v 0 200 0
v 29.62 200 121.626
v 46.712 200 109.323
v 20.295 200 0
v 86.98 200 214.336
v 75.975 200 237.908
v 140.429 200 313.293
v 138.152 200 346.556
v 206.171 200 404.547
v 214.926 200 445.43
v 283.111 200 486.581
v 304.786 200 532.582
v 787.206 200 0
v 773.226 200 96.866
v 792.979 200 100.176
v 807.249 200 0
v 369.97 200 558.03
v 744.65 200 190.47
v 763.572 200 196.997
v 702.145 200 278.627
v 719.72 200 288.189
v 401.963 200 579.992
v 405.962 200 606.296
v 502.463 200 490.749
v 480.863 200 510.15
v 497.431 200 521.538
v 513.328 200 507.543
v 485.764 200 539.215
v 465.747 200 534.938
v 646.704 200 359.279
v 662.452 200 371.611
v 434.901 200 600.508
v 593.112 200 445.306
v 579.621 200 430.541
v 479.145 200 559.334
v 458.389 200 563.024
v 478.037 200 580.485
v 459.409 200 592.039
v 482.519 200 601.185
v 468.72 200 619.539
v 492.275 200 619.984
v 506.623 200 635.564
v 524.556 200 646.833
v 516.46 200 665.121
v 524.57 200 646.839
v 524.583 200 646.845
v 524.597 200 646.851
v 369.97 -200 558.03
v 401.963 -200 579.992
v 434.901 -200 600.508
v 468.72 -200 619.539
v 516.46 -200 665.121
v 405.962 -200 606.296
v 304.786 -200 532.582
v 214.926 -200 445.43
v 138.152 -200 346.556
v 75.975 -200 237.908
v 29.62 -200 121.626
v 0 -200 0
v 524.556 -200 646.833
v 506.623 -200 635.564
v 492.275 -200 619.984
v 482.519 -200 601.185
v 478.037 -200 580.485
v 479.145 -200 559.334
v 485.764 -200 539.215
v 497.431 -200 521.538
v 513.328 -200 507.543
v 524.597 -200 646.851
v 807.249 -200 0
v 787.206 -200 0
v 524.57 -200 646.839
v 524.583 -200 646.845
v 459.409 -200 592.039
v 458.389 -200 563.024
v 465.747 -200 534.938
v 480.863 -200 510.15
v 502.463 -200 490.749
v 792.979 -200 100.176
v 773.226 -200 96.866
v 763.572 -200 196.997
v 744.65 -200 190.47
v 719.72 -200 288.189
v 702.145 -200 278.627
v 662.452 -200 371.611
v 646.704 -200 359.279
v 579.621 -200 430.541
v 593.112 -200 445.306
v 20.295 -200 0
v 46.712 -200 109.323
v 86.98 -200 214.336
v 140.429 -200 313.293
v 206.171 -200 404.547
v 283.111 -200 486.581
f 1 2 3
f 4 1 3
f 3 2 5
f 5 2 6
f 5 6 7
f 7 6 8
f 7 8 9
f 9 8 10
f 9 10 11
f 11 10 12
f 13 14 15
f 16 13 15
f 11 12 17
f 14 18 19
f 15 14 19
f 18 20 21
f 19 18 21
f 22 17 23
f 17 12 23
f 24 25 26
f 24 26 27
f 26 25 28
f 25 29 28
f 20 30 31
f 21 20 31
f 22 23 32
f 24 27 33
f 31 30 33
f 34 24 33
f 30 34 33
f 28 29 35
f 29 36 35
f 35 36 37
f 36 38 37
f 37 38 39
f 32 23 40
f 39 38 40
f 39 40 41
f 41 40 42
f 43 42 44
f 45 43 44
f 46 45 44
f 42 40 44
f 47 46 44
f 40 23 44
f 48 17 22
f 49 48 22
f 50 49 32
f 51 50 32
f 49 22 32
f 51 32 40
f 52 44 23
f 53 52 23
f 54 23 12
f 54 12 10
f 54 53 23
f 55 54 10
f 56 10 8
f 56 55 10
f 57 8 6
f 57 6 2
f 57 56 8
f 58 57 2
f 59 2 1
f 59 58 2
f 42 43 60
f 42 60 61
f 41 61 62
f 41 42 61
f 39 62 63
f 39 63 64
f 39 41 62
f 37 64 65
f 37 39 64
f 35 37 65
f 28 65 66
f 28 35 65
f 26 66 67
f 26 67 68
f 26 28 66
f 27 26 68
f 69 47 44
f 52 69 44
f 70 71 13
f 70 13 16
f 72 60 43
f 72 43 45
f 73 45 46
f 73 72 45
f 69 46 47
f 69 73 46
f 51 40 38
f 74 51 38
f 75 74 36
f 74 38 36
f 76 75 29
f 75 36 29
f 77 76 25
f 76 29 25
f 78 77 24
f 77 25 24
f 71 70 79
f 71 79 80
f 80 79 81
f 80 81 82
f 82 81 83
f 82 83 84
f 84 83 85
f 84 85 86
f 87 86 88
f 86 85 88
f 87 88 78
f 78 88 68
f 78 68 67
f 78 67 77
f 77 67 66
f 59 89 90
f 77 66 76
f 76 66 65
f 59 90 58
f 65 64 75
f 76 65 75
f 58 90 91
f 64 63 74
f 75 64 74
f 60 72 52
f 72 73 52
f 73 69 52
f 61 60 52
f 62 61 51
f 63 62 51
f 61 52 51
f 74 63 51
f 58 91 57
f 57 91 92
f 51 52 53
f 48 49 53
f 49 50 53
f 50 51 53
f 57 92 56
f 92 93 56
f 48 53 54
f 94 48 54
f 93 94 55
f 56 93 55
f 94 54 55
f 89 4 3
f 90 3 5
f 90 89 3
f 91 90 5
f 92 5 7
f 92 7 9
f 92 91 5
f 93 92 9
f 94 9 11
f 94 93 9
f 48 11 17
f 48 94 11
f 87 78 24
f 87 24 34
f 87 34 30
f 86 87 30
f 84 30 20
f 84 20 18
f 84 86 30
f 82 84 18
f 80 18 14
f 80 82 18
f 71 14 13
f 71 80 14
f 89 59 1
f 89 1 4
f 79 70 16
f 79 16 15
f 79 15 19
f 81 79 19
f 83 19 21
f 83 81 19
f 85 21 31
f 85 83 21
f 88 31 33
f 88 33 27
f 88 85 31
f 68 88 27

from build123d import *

# Parameters (mm, degrees)
F1_DEPTH      = 200
F1_DEPTH_BACK = 200
F2_T1_DEPTH   = 400
F4_DEPTH      = 400


# Not quite as in the source:
# - a fillet or chamfer that OpenCascade refuses, or shapes differently, is made with other operations: its cross-section is extruded or revolved along the edge and cut away or added


with BuildPart() as f1:
    # F0 (on Front) → F1 (new body, two sides)
    with BuildSketch(Plane.XZ) as f1_sk:
        with BuildLine():
            Line((524.5966985083, 646.8509630198), (516.4602606489, 665.1211129634))
            ThreePointArc((516.4602606489, 665.1211129634), (174.8026570637, 397.3412013082), (0, 0))
            Line((0, 0), (20.2946136834, 0))
            ThreePointArc((20.2946136834, 0), (140.429327731, 313.2929945553), (369.9696430546, 558.0297788724))
            ThreePointArc((369.9696430546, 558.0297788724), (661.1169981621, 340.7216012774), (787.2059225715, 0))
            Line((787.2059225715, 0), (807.2493330572, 0))
            ThreePointArc((807.2493330572, 0), (681.631739827, 346.6110161721), (389.7878488942, 571.8800100128))
            ThreePointArc((389.7878488942, 571.8800100128), (455.5312679724, 612.3522202116), (524.5966985083, 646.8509630198))
        make_face()
    extrude(amount=F1_DEPTH)
    extrude(f1_sk.sketch, amount=-F1_DEPTH_BACK)

    # F2: fillet of radius 80 on 1 edges, made by hand

    # F2_s2 → F2_t1 (join)
    with BuildSketch(Plane.XZ.offset(-200)):
        with BuildLine():
            ThreePointArc((524.5965325964, 646.8513269885), (478.0294026942, 580.3882007889), (513.5263540919, 507.4100453379))
            Line((513.5263540919, 507.4100453379), (509.1010667383, 500.7453599443))
            ThreePointArc((509.1010667383, 500.7453599443), (449.6679775139, 535.8272349913), (386.8614602924, 564.434377111))
            Line((386.8614602924, 564.434377111), (385.2964579687, 578.5003277629))
            ThreePointArc((385.2964579687, 578.5003277629), (451.6430451413, 619.3438525513), (521.2782630933, 654.13076976))
            Line((521.2782630933, 654.13076976), (524.5965325964, 646.8513269885))
        make_face()
    extrude(amount=F2_T1_DEPTH)

    # F3 (on face) → F4 (cut, through all)
    with BuildSketch(Plane(origin=(0, 200, 0), x_dir=(-1, 0, 0), z_dir=(0, 1, 0))):
        with BuildLine():
            ThreePointArc((-468.7201479158, 619.5389112196), (-461.0435334952, 548.7124418966), (-502.4630068664, 490.7491225353))
            ThreePointArc((-502.4630068664, 490.7491225353), (-438.1743029198, 528.2452259031), (-369.9696430546, 558.0297788724))
            ThreePointArc((-369.9696430546, 558.0297788724), (-418.3179553497, 590.4330572448), (-468.7201479158, 619.5389112196))
        make_face()
    extrude(amount=-F4_DEPTH, mode=Mode.SUBTRACT)


solid = f1.part
